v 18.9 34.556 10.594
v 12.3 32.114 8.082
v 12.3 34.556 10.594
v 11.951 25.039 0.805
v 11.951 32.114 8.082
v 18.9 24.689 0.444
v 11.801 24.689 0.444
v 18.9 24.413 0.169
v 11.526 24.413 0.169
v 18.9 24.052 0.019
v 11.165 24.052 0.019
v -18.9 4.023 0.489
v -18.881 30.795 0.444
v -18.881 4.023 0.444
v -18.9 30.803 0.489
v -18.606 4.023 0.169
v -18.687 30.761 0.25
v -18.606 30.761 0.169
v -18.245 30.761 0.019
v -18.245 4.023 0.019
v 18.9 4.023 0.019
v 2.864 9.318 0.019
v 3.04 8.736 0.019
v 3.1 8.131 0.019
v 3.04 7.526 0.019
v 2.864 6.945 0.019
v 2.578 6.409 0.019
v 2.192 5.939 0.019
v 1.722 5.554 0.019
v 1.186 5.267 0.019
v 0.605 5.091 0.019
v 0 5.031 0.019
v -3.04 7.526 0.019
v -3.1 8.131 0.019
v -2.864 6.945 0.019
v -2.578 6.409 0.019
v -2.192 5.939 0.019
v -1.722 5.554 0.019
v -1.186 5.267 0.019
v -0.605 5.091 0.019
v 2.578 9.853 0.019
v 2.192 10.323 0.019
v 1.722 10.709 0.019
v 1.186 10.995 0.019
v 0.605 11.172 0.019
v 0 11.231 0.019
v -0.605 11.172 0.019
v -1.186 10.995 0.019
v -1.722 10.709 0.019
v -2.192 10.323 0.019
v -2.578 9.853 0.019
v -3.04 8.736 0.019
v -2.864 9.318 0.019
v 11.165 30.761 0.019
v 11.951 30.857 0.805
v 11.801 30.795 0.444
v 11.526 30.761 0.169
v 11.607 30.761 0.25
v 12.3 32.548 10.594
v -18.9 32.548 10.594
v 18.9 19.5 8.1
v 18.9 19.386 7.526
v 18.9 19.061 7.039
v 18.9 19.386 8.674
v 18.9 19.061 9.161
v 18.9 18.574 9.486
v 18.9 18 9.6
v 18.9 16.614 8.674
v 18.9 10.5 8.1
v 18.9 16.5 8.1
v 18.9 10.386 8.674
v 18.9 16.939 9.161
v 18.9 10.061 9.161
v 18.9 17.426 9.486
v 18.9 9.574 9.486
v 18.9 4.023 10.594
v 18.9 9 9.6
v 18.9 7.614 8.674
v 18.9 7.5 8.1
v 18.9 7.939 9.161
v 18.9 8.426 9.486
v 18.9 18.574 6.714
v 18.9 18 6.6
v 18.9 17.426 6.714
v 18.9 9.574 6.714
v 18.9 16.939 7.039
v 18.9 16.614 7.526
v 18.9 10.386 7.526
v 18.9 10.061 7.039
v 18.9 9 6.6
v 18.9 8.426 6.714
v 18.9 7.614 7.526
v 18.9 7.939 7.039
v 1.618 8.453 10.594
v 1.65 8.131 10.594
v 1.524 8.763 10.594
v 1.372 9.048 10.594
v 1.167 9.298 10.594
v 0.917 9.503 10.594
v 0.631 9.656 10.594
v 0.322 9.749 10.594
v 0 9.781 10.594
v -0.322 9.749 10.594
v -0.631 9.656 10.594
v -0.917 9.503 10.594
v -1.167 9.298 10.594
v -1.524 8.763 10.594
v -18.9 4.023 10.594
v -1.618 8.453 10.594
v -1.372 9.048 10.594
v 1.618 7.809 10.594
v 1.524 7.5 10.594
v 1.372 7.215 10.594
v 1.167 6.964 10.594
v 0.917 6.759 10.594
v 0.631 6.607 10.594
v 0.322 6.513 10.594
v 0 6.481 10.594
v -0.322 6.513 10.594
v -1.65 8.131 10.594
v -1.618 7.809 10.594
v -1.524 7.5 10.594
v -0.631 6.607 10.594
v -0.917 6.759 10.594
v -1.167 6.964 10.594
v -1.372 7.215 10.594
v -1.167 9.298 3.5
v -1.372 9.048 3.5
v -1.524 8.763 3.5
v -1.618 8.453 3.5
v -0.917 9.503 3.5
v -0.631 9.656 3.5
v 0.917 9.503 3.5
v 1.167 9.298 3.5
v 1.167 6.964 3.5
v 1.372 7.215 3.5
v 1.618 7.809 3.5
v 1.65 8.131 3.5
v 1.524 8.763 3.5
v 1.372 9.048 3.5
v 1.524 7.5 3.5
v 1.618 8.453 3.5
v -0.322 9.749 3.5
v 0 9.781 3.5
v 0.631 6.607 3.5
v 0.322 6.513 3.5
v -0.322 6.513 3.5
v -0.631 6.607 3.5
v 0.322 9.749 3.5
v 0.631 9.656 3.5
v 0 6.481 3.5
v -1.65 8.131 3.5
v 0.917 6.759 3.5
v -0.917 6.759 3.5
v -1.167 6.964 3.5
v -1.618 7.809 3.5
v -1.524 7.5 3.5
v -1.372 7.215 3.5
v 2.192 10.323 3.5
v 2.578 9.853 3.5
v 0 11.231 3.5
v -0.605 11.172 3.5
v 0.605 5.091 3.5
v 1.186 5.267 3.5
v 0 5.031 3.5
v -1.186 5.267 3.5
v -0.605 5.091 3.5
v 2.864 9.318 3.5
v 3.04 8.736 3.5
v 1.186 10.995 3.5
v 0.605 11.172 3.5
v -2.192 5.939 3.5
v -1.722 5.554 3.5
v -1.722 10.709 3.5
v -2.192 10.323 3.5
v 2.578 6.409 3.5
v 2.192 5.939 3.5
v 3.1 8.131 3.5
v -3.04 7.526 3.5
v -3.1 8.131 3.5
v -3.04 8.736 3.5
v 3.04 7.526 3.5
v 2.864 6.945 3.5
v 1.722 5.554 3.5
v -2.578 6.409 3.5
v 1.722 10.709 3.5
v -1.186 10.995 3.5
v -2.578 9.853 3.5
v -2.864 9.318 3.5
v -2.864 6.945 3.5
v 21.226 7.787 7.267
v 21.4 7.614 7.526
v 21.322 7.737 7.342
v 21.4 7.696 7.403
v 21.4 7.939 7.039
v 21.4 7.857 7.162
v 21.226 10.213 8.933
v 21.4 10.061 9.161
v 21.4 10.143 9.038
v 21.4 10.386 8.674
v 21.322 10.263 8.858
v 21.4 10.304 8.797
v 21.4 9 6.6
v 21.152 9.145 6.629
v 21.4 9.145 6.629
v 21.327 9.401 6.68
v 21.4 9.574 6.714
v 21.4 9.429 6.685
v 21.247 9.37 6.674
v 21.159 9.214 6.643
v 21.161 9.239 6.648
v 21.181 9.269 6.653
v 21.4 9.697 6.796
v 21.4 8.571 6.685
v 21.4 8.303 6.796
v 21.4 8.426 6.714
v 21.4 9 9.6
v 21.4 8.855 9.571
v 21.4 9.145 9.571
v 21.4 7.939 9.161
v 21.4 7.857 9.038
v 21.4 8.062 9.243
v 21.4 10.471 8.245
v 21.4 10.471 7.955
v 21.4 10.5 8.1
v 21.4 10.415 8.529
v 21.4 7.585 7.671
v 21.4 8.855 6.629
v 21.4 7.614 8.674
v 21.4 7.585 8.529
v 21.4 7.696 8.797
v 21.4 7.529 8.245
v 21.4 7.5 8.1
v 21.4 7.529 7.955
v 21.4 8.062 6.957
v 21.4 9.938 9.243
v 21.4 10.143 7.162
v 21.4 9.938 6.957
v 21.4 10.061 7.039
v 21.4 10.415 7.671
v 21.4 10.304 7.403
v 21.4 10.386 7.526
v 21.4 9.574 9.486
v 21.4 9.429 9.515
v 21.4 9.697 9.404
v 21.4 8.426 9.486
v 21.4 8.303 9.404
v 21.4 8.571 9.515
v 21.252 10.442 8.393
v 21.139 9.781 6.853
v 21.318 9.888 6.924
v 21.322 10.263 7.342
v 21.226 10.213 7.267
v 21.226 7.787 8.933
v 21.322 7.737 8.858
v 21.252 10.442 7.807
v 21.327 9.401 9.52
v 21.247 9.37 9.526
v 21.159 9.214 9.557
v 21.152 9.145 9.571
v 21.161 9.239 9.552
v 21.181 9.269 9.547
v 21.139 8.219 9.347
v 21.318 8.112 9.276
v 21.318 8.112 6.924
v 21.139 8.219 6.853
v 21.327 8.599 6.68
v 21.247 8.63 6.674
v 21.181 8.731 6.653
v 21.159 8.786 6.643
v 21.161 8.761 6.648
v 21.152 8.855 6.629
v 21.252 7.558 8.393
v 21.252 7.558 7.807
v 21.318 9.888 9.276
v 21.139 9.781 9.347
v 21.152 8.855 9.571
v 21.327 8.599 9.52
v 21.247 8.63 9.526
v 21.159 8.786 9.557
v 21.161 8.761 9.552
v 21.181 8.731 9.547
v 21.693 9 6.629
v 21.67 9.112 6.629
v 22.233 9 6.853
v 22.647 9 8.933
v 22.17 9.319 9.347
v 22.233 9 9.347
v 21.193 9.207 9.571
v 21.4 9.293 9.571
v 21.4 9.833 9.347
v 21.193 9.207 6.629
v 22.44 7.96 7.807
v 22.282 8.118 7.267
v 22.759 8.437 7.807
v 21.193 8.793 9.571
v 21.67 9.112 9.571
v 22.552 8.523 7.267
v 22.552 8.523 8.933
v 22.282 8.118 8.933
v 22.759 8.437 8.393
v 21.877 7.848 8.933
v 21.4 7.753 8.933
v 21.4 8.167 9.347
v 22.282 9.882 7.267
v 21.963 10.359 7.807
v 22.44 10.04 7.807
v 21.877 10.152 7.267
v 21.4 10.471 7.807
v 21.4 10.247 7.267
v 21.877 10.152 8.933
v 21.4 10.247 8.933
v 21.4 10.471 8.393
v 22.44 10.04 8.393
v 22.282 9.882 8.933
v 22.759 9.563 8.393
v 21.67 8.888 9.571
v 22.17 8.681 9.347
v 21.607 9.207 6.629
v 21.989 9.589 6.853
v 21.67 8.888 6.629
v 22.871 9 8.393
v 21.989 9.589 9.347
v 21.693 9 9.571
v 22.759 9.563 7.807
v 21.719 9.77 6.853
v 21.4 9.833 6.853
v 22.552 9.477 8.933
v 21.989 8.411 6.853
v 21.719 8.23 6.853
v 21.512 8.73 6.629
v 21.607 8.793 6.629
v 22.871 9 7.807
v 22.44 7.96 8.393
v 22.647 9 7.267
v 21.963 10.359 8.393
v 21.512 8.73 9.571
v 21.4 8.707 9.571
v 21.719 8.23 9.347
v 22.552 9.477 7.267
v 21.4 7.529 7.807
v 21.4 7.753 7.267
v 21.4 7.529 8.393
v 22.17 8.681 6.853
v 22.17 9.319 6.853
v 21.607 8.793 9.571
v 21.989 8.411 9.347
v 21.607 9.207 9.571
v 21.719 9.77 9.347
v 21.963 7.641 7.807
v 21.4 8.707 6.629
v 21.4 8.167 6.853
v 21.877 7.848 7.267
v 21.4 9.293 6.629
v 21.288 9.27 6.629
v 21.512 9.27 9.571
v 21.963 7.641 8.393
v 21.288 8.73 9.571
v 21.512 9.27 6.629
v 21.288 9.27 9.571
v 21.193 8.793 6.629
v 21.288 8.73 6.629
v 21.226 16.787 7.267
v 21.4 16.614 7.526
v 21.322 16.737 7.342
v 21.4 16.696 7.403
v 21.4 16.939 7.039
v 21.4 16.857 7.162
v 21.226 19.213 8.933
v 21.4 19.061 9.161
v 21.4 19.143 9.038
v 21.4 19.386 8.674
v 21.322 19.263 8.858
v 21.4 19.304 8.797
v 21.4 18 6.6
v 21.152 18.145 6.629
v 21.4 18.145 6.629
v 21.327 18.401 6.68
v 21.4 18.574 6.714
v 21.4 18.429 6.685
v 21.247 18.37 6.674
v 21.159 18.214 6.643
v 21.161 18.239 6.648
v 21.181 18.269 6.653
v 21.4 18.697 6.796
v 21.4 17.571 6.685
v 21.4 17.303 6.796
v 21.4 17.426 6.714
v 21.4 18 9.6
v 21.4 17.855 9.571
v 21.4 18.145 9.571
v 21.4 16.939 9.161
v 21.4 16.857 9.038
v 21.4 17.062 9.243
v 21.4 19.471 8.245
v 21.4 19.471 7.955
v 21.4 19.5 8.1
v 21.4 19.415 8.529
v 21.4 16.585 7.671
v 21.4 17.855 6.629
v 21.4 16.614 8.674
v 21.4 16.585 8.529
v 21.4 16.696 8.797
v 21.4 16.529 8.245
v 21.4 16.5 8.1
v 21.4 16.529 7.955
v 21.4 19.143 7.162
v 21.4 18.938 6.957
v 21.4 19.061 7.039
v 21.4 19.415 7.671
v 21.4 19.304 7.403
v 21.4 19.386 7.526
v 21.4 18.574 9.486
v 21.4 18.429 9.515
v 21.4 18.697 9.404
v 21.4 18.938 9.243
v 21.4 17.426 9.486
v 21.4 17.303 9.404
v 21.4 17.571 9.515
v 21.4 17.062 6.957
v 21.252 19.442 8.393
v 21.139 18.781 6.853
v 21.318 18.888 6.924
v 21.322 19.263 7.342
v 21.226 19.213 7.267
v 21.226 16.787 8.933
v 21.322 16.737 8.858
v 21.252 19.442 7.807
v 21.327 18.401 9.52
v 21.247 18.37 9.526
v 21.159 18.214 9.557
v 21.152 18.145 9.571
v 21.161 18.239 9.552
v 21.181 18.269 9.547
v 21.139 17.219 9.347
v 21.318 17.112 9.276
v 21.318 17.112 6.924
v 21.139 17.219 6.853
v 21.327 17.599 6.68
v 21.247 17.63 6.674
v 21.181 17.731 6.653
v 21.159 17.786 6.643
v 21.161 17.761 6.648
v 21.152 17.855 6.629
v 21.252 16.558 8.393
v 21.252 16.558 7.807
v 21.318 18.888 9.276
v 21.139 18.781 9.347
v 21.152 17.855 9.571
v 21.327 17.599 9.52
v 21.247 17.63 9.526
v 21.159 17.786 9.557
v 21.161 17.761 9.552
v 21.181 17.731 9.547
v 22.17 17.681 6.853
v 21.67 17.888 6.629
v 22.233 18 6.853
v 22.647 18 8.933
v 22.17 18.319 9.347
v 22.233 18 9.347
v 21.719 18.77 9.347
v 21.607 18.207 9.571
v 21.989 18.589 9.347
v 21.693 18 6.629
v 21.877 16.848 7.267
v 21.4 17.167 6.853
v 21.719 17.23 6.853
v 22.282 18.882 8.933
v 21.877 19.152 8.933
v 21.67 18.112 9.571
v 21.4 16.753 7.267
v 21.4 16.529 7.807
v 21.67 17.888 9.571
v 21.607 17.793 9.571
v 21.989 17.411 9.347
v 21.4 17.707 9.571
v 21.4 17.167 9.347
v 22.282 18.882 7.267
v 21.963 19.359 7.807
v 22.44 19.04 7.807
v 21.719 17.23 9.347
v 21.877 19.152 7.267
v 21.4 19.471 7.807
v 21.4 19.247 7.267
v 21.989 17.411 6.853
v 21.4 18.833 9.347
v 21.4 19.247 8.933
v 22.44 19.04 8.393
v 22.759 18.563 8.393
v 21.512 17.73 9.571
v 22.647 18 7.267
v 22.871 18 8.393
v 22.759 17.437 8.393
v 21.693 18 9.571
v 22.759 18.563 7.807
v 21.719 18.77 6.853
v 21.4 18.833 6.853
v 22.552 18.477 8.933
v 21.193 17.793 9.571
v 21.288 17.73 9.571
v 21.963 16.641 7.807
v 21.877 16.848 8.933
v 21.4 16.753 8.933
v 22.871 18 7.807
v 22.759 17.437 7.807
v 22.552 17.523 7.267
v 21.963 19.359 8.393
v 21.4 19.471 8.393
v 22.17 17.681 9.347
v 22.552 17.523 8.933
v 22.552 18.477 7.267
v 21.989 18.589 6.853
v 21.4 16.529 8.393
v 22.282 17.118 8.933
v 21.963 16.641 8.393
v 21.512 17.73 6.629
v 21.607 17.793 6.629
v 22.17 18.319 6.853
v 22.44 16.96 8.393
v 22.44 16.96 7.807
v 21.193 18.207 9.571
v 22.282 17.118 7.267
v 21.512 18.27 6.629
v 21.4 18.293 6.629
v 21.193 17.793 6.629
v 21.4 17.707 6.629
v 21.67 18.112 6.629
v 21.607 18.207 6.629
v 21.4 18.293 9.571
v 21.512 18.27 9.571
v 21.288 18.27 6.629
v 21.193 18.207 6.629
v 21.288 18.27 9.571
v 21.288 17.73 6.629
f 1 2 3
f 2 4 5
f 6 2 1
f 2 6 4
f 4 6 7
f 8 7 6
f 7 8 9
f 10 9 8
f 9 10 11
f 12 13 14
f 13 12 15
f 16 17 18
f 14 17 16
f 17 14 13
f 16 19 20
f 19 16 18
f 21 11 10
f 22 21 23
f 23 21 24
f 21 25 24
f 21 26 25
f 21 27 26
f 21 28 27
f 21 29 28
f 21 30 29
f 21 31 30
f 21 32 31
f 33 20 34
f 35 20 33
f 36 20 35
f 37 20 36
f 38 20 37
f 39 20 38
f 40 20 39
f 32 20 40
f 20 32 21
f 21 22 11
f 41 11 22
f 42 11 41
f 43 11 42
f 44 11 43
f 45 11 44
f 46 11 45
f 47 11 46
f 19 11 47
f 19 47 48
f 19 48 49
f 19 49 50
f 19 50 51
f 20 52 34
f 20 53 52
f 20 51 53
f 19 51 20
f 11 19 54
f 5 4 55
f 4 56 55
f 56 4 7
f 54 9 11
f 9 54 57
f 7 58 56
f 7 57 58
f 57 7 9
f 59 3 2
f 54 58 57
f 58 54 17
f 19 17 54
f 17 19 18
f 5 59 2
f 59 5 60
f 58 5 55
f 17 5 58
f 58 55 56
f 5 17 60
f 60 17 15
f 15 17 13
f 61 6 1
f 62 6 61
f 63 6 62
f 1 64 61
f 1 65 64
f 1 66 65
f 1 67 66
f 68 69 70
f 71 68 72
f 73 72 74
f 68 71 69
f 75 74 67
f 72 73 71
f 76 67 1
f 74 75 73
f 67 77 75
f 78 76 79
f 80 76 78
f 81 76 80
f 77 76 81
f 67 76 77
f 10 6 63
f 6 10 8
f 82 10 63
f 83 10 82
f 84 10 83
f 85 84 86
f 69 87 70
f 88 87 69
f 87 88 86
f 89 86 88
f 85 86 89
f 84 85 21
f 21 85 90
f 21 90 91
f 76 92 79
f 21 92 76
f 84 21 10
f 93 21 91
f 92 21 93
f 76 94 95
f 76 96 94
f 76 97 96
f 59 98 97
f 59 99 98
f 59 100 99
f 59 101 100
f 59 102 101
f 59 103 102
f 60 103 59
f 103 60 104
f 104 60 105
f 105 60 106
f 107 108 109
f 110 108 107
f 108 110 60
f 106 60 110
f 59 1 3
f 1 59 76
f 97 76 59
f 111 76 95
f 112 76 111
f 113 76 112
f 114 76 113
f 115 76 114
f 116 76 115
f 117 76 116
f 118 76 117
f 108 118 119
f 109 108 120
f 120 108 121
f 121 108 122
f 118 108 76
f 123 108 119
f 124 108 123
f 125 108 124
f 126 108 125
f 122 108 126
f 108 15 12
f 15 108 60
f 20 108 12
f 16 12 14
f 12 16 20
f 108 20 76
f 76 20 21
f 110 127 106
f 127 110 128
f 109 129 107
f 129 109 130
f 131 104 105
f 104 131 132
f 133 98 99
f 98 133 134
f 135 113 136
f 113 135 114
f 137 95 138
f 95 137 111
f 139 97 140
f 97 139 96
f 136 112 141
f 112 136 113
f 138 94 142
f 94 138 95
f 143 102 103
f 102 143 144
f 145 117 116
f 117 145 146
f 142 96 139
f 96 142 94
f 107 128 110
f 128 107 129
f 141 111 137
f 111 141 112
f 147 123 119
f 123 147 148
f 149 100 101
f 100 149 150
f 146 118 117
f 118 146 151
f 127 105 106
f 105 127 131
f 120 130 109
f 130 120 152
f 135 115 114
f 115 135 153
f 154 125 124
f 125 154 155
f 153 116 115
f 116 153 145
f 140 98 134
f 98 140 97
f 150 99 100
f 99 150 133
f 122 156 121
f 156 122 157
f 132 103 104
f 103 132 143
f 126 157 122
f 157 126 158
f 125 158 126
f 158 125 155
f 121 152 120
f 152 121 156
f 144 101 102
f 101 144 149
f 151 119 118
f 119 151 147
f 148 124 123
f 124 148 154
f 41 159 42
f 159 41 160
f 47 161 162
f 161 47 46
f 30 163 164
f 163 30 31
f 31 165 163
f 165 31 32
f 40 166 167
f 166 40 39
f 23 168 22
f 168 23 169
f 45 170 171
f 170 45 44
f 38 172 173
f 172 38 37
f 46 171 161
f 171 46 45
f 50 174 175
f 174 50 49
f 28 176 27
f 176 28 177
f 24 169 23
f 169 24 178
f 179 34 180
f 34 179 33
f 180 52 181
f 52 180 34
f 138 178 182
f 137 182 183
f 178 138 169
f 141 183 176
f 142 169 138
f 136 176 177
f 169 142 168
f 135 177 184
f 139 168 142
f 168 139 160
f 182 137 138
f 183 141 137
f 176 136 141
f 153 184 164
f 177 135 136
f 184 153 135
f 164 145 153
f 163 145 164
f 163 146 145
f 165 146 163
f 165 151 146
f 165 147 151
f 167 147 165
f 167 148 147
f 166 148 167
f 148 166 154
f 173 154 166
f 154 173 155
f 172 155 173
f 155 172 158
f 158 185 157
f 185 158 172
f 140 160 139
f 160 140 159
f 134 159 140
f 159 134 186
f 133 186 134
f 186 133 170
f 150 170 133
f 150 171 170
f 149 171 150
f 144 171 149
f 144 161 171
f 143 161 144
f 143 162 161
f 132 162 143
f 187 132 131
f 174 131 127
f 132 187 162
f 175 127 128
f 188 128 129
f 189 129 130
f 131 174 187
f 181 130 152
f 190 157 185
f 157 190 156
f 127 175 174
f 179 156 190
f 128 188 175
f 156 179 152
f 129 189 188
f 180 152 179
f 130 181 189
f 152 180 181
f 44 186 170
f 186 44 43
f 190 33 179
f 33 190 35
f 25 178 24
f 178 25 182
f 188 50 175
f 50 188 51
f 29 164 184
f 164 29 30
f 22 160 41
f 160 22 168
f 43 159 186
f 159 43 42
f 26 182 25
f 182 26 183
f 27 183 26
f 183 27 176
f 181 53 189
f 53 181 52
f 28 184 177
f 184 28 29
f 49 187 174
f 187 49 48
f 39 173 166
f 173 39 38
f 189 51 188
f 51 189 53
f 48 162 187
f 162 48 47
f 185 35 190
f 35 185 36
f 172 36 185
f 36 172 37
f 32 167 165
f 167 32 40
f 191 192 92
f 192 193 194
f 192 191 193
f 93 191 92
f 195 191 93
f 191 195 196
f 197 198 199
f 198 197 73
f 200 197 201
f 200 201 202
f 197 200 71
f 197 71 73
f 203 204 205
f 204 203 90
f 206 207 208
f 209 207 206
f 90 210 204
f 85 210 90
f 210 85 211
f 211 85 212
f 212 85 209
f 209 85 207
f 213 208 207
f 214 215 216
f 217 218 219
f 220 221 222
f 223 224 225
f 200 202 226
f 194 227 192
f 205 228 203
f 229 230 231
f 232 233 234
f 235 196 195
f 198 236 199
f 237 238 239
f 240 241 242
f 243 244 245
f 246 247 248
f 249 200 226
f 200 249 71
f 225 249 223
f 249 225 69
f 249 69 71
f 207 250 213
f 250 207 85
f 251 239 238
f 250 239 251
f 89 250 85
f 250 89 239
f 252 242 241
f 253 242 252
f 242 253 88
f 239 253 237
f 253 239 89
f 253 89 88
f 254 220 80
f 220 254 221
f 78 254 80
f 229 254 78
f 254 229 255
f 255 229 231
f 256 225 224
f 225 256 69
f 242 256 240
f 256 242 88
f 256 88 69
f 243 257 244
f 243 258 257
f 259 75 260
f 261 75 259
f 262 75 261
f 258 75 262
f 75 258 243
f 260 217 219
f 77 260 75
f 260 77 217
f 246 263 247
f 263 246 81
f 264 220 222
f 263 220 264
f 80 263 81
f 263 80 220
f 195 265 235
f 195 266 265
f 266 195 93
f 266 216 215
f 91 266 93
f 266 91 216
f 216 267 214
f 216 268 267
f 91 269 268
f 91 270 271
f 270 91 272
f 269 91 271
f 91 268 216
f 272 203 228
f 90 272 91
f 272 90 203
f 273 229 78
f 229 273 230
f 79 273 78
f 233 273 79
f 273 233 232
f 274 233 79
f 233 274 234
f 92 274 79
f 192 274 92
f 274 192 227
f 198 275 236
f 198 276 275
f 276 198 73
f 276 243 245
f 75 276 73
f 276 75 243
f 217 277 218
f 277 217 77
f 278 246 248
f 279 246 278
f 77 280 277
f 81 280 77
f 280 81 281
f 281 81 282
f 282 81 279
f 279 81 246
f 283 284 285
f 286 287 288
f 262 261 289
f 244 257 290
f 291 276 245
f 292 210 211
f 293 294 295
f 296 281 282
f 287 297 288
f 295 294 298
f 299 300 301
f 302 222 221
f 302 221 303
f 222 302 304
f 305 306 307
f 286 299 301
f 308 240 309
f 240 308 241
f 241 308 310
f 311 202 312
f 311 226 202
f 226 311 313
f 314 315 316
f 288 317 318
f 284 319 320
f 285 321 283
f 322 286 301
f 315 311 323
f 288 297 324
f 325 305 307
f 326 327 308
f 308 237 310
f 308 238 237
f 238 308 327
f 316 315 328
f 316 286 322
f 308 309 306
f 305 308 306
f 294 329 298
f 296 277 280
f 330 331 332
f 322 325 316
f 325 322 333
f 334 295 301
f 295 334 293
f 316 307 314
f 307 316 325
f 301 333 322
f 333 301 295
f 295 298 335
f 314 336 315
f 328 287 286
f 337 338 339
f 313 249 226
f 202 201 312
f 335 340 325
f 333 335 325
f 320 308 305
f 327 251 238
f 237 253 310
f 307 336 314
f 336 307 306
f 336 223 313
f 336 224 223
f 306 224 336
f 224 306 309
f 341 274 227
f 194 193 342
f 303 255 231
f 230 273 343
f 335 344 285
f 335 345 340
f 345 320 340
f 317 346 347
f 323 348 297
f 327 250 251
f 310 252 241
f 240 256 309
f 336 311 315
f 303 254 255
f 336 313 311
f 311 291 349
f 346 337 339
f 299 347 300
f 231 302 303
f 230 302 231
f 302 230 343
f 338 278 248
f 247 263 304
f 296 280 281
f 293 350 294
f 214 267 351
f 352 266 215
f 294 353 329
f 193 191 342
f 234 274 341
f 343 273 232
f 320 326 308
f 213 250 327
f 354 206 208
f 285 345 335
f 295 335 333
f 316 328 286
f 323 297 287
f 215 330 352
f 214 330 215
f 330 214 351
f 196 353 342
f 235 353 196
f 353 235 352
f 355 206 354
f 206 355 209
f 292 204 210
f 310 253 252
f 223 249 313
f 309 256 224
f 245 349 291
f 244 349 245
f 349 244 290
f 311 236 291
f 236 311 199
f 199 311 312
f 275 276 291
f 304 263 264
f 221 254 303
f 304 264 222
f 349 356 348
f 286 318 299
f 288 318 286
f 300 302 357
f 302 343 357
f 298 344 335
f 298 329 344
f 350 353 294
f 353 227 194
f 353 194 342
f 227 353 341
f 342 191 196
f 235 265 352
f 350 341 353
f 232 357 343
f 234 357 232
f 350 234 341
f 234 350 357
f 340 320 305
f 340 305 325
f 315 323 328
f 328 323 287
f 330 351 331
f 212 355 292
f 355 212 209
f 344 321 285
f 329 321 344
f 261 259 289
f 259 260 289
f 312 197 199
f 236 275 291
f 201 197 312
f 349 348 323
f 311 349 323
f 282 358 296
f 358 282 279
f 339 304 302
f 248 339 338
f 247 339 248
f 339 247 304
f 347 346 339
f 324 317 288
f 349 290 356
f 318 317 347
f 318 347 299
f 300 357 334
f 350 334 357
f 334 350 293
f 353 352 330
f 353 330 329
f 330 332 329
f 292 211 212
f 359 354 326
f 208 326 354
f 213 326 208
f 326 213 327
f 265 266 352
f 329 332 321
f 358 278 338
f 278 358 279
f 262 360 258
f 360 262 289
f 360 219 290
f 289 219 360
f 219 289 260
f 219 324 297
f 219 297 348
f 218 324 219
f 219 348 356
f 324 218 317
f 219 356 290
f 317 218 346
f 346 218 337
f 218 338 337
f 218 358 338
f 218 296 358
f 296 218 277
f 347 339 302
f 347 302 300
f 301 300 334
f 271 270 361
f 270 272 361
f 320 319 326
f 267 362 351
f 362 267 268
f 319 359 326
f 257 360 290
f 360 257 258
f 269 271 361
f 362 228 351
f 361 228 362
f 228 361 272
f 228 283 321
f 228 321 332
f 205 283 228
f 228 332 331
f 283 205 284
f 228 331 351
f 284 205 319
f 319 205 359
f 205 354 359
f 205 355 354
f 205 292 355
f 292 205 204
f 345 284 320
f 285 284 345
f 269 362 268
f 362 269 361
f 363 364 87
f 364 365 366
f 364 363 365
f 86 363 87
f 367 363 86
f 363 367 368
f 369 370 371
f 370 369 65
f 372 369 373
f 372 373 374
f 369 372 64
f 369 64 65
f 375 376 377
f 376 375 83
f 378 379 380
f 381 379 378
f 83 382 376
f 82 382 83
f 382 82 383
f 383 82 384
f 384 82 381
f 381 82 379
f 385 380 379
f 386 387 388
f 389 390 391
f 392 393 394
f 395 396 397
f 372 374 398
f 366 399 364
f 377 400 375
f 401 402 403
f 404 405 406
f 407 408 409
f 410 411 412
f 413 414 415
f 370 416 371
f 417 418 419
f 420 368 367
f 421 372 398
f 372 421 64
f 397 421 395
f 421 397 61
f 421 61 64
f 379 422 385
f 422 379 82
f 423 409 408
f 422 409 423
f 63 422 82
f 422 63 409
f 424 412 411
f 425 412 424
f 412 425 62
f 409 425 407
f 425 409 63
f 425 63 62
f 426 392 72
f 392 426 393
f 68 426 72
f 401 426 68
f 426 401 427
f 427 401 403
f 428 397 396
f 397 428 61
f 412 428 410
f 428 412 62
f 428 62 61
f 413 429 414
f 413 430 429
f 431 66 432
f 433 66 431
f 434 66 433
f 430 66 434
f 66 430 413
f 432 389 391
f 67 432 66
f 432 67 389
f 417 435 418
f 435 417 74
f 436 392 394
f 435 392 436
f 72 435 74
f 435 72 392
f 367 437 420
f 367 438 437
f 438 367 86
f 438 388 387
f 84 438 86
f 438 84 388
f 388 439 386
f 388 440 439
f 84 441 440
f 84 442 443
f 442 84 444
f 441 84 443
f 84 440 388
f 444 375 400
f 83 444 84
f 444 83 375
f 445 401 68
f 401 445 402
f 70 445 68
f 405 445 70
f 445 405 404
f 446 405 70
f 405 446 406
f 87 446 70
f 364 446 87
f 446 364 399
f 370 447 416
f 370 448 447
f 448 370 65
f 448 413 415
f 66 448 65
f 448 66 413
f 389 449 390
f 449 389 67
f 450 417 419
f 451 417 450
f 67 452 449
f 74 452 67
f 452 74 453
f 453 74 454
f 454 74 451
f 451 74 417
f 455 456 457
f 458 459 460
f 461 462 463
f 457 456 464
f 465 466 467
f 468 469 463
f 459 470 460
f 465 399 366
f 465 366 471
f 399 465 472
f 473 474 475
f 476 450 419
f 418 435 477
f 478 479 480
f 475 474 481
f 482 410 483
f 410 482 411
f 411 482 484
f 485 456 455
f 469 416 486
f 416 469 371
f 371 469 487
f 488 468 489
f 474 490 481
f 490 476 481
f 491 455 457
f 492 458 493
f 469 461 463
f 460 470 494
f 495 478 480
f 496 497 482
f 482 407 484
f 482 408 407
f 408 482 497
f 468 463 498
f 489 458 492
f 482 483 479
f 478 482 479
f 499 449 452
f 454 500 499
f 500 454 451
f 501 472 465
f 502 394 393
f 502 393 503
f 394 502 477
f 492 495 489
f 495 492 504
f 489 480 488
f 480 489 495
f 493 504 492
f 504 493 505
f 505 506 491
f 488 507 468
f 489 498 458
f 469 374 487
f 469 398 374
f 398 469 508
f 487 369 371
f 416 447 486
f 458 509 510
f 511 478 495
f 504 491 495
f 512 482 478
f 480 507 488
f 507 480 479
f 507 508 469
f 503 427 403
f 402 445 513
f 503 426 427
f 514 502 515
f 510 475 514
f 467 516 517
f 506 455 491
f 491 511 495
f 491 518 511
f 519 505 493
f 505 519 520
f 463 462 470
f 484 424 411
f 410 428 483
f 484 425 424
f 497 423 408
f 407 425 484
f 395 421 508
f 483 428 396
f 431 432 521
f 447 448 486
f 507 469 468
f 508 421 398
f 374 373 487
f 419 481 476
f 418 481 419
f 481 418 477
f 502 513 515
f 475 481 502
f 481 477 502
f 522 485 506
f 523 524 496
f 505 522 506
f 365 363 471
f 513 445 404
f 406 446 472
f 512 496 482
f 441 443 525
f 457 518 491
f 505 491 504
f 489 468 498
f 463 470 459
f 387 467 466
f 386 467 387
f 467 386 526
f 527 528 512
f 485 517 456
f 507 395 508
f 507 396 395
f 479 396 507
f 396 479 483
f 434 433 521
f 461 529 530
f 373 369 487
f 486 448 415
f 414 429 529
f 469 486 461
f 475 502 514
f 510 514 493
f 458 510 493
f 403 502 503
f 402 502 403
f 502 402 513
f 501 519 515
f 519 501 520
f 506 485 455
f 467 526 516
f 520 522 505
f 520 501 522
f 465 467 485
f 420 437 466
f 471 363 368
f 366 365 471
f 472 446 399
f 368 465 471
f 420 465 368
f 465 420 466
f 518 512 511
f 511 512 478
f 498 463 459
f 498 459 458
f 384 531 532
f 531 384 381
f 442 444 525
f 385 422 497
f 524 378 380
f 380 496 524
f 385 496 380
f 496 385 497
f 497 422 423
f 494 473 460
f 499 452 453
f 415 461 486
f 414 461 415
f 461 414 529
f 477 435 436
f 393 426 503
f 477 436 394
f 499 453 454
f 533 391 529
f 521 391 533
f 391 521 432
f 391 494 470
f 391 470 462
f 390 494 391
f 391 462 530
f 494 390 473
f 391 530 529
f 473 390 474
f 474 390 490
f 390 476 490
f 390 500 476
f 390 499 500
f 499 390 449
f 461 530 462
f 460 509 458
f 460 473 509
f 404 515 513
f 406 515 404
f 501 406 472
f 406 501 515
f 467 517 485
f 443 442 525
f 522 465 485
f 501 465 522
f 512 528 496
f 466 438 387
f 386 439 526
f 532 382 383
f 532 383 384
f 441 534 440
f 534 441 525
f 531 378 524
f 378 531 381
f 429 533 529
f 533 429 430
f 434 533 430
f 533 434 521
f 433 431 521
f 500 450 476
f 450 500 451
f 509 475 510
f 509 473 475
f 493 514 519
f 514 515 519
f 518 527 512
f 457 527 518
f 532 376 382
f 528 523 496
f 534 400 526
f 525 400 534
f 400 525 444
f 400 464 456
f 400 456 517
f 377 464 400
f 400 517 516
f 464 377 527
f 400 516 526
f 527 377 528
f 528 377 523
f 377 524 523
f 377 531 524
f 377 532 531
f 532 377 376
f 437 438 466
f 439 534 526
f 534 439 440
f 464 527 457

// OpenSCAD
// --- BUMPER BRACKET — TREAD RETENTION CAP ---
// Closes the −Z tread-slot mouth (face D) so the back-to-back treads cannot slide
// out. Rather than a slab projecting past the mouth, the cap is a flush plug: the
// bracket carries a rectangular "cube hull" recess in the gap below the seated
// treads and the cap fills it flush with the existing profile. Held by one central
// M3×20 socket-head cap screw whose head seats in the cap and whose shaft threads
// into a hex nut captured in the bracket body behind the inner tread (see
// config.scad / bumper-bracket.scad). Mirrors the prayer-sole v3 fastener pattern
// with a single central bolt.
//
// Modeled in the bracket coordinate frame (same as bumper-bracket.scad), so in the
// assembly the cap drops into the recess with no extra transform. Standalone it is
// laid outer-face-down on the bed for printing.

render_standalone_export = false;   // suppress bumper-bracket.scad root emit
include <bumper-bracket.scad>

$fn = preview ? 32 : 64;

// Root emit unless an includer (assembly.scad) suppresses it.
cap_emit_if_root = is_undef(cap_suppress_root) ? true : !cap_suppress_root;

// Through-shaft + socket-head recess, cut from the cap's outer (−Z / mouth) face.
module tread_cap_bolt_hole() {
    shaft_d = cap_bolt_dia + cap_bolt_clearance;
    head_d  = cap_head_dia + cap_head_clearance + 0.1;
    z_outer = tread_cap_outer_z_mm();
    shaft_h = (tread_cap_recess_z_hi_mm() - z_outer) + epsilon * 8;
    translate([cap_bolt_x_mm, cap_bolt_y_mm(), z_outer - epsilon * 4]) {
        cylinder(h = shaft_h, d = shaft_d);
        cylinder(h = cap_head_height + epsilon * 4, d = head_d);
    }
}

// Flush plug: the recess volume (shrunk by the fit clearance) intersected with the
// beveled body solid, so the cap is solid across the slot opening (stops the
// treads) while matching the bracket's beveled top and rounded mouth faces.
module tread_cap() {
    union() {
        difference() {
            intersection() {
                shell_solid_no_tread_pockets();
                tread_cap_recess_volume(cap_fit_clearance_mm);
            }
            tread_cap_bolt_hole();
        }
        cap_guide_pins();
    }
}

// Standalone: lay the cap outer face on the bed (head pocket opens downward).
if (cap_emit_if_root)
    translate([0, 0, -tread_cap_outer_z_mm()])
        tread_cap();
